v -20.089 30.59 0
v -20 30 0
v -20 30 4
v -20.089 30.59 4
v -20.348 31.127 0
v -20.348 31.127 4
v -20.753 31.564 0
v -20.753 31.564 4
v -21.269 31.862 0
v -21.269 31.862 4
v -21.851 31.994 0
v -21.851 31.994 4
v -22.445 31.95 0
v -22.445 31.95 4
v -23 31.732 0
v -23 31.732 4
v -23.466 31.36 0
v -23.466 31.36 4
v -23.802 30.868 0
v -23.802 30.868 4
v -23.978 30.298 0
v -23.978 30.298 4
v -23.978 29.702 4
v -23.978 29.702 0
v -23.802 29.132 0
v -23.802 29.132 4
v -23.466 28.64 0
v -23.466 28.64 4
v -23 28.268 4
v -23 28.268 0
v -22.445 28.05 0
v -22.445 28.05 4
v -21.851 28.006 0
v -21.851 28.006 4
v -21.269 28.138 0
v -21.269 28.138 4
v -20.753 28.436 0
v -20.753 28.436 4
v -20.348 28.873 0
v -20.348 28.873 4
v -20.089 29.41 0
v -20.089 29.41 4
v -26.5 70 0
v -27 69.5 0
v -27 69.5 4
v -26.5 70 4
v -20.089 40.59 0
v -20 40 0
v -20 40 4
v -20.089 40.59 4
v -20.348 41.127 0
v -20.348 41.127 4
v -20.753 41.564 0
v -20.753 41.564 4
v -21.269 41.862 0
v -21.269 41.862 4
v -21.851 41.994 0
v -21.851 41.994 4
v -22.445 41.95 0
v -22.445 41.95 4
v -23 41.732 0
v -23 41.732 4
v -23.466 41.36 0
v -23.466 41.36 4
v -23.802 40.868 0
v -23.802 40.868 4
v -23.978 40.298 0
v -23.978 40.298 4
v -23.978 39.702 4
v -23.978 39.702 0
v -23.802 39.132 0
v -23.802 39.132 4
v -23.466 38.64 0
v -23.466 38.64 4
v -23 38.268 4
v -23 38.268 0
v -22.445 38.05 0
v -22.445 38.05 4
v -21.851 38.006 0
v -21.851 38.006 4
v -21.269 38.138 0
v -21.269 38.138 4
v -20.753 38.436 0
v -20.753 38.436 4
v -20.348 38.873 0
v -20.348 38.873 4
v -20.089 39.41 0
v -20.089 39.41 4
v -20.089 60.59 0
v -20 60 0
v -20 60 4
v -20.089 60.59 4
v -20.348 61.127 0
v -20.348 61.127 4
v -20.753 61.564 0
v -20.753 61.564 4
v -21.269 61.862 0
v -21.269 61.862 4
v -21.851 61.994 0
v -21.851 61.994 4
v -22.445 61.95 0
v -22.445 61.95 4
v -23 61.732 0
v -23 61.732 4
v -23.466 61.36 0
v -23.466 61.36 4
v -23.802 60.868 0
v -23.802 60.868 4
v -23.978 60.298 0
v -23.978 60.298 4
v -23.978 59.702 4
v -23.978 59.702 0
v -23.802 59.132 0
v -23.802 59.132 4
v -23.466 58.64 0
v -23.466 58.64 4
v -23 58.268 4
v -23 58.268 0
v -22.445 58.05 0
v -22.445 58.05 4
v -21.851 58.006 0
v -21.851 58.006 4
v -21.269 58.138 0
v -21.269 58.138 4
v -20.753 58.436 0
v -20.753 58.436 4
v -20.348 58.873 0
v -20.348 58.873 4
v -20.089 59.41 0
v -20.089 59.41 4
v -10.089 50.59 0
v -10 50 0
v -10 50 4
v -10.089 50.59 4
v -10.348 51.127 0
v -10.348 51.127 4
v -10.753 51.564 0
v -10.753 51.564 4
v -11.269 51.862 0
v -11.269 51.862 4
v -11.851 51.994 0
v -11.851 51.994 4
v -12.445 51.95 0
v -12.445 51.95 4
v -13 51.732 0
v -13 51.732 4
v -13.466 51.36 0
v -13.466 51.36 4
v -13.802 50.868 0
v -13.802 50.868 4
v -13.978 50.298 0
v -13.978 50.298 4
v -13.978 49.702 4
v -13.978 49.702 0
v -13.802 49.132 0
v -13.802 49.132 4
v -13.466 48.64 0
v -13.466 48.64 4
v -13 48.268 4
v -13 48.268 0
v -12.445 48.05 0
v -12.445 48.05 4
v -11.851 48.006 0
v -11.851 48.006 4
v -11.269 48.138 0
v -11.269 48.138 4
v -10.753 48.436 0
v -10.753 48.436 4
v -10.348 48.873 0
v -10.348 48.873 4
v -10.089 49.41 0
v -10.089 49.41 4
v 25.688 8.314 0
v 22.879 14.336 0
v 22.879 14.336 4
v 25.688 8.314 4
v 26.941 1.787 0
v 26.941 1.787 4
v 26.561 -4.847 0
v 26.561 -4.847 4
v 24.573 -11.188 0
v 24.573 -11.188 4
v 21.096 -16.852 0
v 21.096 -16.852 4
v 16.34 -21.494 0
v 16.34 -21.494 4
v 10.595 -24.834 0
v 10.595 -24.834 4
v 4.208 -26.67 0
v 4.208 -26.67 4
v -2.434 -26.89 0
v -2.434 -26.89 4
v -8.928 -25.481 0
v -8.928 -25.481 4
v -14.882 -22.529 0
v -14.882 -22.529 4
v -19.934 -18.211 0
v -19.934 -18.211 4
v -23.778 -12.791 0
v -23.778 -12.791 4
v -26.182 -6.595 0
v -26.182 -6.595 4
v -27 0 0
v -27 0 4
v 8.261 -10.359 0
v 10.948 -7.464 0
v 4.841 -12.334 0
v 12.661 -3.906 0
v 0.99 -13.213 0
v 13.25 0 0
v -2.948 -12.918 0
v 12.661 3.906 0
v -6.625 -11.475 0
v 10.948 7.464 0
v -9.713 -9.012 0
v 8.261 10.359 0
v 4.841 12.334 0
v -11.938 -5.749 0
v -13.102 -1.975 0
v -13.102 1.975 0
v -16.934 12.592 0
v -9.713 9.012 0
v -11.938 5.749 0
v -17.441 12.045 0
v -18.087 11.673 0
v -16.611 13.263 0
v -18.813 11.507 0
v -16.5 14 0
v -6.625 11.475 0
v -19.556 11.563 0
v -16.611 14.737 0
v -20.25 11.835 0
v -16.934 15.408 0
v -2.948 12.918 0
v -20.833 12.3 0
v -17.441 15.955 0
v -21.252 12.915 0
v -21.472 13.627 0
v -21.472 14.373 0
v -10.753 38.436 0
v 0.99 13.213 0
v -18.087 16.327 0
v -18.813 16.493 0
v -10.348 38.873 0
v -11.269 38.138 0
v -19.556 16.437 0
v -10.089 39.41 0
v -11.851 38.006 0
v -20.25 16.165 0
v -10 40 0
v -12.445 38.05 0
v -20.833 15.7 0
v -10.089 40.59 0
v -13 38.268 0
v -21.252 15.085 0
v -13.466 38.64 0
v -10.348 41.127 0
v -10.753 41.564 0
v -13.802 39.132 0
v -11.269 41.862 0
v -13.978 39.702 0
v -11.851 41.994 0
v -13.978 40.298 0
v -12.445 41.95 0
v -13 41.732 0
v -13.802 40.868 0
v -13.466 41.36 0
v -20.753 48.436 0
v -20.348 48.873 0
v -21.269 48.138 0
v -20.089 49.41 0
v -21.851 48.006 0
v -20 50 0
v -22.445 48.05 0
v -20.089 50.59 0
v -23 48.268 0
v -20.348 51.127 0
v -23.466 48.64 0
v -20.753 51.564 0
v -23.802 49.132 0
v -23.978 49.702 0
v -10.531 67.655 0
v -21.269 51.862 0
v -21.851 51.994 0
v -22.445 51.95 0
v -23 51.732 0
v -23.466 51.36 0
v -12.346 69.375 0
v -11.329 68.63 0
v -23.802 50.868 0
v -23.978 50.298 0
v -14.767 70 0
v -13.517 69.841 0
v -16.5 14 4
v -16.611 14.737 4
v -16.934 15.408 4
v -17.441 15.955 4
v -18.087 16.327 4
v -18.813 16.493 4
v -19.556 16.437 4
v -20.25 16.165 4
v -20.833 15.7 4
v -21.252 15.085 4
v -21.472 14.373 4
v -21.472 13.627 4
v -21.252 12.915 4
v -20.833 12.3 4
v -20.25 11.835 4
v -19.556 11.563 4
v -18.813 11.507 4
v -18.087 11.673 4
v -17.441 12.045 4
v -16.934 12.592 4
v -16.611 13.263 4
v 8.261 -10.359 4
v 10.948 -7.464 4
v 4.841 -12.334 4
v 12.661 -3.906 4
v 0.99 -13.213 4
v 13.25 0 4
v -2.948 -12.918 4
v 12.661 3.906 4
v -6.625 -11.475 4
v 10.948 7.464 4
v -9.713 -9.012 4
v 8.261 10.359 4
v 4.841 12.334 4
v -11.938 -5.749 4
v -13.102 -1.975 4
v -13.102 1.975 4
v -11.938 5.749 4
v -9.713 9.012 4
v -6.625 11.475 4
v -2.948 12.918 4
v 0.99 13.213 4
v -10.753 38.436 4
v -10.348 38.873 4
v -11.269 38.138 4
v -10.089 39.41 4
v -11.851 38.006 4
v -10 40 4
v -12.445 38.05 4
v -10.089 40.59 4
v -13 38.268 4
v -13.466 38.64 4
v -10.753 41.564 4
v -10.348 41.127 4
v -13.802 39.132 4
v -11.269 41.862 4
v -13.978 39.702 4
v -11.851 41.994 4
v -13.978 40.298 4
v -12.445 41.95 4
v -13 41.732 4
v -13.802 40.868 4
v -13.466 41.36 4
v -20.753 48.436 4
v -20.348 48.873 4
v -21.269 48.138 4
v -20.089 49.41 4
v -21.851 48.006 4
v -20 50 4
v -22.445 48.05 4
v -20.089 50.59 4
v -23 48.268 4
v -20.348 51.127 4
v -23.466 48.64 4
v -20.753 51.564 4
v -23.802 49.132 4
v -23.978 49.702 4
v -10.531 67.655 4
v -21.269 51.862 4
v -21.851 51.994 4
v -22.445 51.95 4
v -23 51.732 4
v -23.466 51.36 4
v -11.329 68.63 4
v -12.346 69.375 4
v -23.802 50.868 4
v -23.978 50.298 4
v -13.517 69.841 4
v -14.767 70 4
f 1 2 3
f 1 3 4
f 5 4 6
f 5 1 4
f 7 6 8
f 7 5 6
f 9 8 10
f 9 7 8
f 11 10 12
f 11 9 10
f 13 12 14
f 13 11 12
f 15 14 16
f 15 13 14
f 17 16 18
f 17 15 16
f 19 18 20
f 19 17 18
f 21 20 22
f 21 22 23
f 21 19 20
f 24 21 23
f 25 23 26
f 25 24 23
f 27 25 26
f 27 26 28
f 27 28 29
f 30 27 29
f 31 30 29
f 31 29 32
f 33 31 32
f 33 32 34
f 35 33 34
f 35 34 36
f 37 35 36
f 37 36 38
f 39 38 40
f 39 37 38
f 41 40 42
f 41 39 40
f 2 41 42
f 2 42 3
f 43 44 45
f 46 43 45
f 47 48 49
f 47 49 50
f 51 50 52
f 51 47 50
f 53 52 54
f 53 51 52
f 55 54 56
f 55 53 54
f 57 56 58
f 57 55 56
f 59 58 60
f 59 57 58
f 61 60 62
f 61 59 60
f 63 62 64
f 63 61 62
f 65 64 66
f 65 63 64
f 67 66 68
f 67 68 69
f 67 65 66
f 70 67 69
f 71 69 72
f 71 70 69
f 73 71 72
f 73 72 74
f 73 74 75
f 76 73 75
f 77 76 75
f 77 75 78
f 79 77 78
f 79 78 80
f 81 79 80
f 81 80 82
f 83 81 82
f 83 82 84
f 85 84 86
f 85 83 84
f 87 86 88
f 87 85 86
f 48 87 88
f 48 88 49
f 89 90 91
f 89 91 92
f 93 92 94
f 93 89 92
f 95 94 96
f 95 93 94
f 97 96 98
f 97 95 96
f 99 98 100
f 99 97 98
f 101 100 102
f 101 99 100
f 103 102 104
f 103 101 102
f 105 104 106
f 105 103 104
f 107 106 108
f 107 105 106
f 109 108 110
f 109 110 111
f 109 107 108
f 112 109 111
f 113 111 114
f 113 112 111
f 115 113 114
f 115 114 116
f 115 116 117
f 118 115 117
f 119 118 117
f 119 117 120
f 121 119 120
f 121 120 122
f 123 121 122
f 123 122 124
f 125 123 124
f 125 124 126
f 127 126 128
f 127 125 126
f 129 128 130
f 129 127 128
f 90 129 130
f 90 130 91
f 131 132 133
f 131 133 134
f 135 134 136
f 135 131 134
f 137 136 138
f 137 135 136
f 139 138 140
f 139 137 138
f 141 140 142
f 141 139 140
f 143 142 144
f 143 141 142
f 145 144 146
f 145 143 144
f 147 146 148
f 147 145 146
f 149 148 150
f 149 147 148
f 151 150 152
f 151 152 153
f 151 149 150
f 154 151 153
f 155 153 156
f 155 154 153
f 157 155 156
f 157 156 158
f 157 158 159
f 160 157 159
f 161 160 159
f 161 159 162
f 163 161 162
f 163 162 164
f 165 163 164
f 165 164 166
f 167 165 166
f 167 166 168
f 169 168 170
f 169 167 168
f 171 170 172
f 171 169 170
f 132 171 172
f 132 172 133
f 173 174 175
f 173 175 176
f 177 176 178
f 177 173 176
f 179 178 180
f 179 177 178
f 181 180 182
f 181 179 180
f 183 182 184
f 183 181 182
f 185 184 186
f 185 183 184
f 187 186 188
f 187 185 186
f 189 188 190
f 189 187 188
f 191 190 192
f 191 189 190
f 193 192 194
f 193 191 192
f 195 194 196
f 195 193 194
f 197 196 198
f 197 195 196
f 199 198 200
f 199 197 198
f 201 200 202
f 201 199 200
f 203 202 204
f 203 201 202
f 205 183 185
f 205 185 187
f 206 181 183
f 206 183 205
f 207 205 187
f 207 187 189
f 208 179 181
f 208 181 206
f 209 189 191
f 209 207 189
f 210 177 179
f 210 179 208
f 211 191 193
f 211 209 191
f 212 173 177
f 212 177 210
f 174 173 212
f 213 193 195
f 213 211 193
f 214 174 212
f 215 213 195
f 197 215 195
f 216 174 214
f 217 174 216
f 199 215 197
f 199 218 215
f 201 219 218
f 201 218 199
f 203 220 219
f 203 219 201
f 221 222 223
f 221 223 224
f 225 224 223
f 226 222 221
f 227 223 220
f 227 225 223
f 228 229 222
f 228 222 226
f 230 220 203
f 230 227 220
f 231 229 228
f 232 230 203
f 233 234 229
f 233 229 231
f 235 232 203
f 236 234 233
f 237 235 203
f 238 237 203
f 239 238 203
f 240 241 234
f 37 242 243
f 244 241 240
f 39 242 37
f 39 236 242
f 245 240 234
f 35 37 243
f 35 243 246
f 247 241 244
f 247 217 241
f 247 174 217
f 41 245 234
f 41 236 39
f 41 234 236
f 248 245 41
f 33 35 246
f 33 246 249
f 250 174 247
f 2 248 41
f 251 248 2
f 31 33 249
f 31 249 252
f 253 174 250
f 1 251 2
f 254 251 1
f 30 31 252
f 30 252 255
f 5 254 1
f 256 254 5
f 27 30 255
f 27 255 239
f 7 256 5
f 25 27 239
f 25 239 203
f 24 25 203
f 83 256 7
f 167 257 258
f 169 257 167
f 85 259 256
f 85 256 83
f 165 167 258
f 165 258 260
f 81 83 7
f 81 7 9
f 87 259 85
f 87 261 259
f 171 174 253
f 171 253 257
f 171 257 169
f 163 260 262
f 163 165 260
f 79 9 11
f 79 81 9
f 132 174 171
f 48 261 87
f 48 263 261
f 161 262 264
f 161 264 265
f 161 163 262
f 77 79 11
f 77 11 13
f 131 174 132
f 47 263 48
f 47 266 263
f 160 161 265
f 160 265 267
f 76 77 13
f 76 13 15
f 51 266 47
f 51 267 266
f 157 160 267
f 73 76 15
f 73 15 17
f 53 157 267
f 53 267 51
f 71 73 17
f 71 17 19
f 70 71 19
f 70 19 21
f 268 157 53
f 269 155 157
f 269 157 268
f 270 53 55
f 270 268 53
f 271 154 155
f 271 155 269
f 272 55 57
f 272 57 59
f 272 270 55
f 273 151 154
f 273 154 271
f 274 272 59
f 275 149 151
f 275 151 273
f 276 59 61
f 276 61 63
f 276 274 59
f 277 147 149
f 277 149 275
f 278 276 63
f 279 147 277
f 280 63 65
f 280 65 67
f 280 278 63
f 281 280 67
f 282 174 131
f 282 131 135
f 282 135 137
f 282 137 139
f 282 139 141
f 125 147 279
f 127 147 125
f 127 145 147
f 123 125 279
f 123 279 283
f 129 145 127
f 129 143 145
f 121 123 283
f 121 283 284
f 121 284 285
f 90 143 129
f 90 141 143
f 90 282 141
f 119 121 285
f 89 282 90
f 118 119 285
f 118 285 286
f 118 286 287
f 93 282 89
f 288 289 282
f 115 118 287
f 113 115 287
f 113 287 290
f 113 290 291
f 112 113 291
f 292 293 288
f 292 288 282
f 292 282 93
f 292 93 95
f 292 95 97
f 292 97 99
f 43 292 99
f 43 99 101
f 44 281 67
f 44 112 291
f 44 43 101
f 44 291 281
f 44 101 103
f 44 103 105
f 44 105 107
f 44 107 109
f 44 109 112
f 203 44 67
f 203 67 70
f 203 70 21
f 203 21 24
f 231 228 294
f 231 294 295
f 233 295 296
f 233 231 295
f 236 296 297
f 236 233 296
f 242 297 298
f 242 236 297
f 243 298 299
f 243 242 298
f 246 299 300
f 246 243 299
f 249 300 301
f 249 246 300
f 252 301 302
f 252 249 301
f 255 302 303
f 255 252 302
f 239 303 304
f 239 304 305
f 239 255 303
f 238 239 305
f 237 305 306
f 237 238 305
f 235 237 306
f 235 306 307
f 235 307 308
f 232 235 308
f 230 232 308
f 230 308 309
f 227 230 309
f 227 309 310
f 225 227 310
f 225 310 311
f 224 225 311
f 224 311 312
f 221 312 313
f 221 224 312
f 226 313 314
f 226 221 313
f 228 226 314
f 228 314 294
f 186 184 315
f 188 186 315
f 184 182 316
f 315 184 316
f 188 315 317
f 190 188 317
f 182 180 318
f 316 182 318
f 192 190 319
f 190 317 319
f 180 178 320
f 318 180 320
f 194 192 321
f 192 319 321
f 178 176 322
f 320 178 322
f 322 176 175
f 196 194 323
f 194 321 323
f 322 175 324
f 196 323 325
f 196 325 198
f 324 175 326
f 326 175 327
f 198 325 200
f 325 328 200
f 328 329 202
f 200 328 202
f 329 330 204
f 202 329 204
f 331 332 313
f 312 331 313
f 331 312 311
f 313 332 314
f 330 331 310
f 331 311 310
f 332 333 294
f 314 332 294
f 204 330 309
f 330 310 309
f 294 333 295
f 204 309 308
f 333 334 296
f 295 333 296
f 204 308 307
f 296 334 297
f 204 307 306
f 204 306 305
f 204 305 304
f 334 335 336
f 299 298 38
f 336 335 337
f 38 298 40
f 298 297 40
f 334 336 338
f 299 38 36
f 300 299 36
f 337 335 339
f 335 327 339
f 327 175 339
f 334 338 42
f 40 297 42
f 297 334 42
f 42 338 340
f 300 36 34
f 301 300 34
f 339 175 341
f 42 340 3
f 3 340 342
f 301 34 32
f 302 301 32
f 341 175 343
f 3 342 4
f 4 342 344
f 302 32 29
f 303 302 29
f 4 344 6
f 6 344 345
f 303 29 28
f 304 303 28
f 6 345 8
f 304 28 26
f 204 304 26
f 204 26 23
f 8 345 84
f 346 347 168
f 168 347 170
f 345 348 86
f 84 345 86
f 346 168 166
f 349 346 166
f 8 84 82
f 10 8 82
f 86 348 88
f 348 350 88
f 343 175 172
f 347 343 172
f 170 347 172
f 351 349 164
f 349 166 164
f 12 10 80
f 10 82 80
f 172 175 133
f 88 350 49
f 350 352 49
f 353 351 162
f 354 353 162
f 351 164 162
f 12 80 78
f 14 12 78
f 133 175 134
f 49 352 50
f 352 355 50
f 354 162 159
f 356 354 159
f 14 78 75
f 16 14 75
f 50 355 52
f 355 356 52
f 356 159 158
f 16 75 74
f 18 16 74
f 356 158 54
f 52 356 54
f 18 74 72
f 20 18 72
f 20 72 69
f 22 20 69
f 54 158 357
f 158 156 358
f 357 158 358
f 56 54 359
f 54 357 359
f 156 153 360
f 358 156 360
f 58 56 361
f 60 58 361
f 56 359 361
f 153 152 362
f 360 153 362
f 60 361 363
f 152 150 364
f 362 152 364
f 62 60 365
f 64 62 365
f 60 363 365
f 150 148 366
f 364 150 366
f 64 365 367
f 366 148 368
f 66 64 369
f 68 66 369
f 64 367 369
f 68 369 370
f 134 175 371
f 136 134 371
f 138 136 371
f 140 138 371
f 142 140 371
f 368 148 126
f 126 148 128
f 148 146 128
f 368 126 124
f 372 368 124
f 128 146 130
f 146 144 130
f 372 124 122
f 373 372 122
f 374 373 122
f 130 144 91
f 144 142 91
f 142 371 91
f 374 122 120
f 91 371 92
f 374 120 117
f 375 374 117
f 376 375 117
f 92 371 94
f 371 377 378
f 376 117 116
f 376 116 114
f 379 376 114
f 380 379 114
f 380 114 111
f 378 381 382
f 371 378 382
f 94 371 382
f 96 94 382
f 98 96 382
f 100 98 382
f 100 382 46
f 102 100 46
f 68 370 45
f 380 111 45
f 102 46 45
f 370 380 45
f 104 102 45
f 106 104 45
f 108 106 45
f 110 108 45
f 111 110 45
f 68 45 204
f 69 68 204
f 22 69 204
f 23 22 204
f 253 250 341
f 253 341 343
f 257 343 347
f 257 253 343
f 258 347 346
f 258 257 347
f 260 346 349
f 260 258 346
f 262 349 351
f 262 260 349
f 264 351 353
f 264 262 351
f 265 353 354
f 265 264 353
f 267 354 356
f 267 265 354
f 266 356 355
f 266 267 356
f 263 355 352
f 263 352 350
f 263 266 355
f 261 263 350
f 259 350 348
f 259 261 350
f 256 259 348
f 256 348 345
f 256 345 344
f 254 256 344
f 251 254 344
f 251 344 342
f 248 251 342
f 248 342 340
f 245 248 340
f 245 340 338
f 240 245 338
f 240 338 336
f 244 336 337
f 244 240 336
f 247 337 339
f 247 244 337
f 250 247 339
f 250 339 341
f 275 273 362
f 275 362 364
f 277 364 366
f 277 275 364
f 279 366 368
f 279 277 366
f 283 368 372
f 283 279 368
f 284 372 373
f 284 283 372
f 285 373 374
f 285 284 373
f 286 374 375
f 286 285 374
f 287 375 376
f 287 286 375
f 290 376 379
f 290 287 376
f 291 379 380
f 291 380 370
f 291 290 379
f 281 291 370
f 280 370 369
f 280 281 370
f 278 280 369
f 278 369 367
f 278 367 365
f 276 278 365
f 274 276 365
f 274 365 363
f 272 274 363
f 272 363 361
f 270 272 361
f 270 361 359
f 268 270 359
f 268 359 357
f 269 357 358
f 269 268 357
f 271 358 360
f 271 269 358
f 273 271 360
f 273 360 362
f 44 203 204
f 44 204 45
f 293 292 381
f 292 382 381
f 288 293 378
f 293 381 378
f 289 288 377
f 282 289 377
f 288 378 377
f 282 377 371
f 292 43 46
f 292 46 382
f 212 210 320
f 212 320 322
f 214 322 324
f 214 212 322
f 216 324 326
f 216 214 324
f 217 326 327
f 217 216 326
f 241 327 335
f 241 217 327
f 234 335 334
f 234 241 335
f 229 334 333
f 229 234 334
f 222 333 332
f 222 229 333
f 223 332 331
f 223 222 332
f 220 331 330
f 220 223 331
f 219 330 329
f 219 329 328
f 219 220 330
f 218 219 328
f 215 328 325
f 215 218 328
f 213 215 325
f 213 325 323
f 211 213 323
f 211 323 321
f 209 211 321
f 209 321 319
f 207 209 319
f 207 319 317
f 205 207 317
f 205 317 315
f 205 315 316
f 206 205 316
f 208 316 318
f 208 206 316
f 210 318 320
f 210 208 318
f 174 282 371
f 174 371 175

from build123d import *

# Parameters (mm, degrees)
SKETCH_1_R      = 2
SKETCH_1_R_2    = 13.25
SKETCH_1_R_3    = 2.5
EXTRUDE_1_DEPTH = 4
FILLET_1_R      = 5
CHAMFER_1_SIZE  = 0.5


with BuildPart() as part:
    # 草图1 → 凸台-拉伸1 (new body)
    with BuildSketch(Plane.XY):
        with BuildLine():
            Line((-27, 0), (-27, 70))
            Line((-27, 70), (-11.999997176, 70))
            Line((-11.999997176, 70), (22.879375353, 14.336463423))
            ThreePointArc((22.879375353, 14.336463423), (7.458447073, -25.949403987), (-27, 0))
        make_face()
        with Locations((-22, 60)):
            Circle(SKETCH_1_R, mode=Mode.SUBTRACT)
        with Locations((-22, 50)):
            Circle(SKETCH_1_R, mode=Mode.SUBTRACT)
        with Locations((-22, 30)):
            Circle(SKETCH_1_R, mode=Mode.SUBTRACT)
        with Locations((-22, 40)):
            Circle(SKETCH_1_R, mode=Mode.SUBTRACT)
        with Locations((-12, 50)):
            Circle(SKETCH_1_R, mode=Mode.SUBTRACT)
        Circle(SKETCH_1_R_2, mode=Mode.SUBTRACT)
        with Locations((-12, 40)):
            Circle(SKETCH_1_R, mode=Mode.SUBTRACT)
        with Locations((-19, 14)):
            Circle(SKETCH_1_R_3, mode=Mode.SUBTRACT)
    extrude(amount=EXTRUDE_1_DEPTH)

    # 圆角1
    fillet_1_edges = [part.edges().sort_by_distance(p)[0] for p in [
        (-11.999997176, 70, 2),
    ]]
    fillet(fillet_1_edges, radius=FILLET_1_R)

    # 倒角1
    chamfer_1_edges = [part.edges().sort_by_distance(p)[0] for p in [
        (-27, 70, 2),
    ]]
    chamfer(chamfer_1_edges, length=CHAMFER_1_SIZE)


solid = part.part
